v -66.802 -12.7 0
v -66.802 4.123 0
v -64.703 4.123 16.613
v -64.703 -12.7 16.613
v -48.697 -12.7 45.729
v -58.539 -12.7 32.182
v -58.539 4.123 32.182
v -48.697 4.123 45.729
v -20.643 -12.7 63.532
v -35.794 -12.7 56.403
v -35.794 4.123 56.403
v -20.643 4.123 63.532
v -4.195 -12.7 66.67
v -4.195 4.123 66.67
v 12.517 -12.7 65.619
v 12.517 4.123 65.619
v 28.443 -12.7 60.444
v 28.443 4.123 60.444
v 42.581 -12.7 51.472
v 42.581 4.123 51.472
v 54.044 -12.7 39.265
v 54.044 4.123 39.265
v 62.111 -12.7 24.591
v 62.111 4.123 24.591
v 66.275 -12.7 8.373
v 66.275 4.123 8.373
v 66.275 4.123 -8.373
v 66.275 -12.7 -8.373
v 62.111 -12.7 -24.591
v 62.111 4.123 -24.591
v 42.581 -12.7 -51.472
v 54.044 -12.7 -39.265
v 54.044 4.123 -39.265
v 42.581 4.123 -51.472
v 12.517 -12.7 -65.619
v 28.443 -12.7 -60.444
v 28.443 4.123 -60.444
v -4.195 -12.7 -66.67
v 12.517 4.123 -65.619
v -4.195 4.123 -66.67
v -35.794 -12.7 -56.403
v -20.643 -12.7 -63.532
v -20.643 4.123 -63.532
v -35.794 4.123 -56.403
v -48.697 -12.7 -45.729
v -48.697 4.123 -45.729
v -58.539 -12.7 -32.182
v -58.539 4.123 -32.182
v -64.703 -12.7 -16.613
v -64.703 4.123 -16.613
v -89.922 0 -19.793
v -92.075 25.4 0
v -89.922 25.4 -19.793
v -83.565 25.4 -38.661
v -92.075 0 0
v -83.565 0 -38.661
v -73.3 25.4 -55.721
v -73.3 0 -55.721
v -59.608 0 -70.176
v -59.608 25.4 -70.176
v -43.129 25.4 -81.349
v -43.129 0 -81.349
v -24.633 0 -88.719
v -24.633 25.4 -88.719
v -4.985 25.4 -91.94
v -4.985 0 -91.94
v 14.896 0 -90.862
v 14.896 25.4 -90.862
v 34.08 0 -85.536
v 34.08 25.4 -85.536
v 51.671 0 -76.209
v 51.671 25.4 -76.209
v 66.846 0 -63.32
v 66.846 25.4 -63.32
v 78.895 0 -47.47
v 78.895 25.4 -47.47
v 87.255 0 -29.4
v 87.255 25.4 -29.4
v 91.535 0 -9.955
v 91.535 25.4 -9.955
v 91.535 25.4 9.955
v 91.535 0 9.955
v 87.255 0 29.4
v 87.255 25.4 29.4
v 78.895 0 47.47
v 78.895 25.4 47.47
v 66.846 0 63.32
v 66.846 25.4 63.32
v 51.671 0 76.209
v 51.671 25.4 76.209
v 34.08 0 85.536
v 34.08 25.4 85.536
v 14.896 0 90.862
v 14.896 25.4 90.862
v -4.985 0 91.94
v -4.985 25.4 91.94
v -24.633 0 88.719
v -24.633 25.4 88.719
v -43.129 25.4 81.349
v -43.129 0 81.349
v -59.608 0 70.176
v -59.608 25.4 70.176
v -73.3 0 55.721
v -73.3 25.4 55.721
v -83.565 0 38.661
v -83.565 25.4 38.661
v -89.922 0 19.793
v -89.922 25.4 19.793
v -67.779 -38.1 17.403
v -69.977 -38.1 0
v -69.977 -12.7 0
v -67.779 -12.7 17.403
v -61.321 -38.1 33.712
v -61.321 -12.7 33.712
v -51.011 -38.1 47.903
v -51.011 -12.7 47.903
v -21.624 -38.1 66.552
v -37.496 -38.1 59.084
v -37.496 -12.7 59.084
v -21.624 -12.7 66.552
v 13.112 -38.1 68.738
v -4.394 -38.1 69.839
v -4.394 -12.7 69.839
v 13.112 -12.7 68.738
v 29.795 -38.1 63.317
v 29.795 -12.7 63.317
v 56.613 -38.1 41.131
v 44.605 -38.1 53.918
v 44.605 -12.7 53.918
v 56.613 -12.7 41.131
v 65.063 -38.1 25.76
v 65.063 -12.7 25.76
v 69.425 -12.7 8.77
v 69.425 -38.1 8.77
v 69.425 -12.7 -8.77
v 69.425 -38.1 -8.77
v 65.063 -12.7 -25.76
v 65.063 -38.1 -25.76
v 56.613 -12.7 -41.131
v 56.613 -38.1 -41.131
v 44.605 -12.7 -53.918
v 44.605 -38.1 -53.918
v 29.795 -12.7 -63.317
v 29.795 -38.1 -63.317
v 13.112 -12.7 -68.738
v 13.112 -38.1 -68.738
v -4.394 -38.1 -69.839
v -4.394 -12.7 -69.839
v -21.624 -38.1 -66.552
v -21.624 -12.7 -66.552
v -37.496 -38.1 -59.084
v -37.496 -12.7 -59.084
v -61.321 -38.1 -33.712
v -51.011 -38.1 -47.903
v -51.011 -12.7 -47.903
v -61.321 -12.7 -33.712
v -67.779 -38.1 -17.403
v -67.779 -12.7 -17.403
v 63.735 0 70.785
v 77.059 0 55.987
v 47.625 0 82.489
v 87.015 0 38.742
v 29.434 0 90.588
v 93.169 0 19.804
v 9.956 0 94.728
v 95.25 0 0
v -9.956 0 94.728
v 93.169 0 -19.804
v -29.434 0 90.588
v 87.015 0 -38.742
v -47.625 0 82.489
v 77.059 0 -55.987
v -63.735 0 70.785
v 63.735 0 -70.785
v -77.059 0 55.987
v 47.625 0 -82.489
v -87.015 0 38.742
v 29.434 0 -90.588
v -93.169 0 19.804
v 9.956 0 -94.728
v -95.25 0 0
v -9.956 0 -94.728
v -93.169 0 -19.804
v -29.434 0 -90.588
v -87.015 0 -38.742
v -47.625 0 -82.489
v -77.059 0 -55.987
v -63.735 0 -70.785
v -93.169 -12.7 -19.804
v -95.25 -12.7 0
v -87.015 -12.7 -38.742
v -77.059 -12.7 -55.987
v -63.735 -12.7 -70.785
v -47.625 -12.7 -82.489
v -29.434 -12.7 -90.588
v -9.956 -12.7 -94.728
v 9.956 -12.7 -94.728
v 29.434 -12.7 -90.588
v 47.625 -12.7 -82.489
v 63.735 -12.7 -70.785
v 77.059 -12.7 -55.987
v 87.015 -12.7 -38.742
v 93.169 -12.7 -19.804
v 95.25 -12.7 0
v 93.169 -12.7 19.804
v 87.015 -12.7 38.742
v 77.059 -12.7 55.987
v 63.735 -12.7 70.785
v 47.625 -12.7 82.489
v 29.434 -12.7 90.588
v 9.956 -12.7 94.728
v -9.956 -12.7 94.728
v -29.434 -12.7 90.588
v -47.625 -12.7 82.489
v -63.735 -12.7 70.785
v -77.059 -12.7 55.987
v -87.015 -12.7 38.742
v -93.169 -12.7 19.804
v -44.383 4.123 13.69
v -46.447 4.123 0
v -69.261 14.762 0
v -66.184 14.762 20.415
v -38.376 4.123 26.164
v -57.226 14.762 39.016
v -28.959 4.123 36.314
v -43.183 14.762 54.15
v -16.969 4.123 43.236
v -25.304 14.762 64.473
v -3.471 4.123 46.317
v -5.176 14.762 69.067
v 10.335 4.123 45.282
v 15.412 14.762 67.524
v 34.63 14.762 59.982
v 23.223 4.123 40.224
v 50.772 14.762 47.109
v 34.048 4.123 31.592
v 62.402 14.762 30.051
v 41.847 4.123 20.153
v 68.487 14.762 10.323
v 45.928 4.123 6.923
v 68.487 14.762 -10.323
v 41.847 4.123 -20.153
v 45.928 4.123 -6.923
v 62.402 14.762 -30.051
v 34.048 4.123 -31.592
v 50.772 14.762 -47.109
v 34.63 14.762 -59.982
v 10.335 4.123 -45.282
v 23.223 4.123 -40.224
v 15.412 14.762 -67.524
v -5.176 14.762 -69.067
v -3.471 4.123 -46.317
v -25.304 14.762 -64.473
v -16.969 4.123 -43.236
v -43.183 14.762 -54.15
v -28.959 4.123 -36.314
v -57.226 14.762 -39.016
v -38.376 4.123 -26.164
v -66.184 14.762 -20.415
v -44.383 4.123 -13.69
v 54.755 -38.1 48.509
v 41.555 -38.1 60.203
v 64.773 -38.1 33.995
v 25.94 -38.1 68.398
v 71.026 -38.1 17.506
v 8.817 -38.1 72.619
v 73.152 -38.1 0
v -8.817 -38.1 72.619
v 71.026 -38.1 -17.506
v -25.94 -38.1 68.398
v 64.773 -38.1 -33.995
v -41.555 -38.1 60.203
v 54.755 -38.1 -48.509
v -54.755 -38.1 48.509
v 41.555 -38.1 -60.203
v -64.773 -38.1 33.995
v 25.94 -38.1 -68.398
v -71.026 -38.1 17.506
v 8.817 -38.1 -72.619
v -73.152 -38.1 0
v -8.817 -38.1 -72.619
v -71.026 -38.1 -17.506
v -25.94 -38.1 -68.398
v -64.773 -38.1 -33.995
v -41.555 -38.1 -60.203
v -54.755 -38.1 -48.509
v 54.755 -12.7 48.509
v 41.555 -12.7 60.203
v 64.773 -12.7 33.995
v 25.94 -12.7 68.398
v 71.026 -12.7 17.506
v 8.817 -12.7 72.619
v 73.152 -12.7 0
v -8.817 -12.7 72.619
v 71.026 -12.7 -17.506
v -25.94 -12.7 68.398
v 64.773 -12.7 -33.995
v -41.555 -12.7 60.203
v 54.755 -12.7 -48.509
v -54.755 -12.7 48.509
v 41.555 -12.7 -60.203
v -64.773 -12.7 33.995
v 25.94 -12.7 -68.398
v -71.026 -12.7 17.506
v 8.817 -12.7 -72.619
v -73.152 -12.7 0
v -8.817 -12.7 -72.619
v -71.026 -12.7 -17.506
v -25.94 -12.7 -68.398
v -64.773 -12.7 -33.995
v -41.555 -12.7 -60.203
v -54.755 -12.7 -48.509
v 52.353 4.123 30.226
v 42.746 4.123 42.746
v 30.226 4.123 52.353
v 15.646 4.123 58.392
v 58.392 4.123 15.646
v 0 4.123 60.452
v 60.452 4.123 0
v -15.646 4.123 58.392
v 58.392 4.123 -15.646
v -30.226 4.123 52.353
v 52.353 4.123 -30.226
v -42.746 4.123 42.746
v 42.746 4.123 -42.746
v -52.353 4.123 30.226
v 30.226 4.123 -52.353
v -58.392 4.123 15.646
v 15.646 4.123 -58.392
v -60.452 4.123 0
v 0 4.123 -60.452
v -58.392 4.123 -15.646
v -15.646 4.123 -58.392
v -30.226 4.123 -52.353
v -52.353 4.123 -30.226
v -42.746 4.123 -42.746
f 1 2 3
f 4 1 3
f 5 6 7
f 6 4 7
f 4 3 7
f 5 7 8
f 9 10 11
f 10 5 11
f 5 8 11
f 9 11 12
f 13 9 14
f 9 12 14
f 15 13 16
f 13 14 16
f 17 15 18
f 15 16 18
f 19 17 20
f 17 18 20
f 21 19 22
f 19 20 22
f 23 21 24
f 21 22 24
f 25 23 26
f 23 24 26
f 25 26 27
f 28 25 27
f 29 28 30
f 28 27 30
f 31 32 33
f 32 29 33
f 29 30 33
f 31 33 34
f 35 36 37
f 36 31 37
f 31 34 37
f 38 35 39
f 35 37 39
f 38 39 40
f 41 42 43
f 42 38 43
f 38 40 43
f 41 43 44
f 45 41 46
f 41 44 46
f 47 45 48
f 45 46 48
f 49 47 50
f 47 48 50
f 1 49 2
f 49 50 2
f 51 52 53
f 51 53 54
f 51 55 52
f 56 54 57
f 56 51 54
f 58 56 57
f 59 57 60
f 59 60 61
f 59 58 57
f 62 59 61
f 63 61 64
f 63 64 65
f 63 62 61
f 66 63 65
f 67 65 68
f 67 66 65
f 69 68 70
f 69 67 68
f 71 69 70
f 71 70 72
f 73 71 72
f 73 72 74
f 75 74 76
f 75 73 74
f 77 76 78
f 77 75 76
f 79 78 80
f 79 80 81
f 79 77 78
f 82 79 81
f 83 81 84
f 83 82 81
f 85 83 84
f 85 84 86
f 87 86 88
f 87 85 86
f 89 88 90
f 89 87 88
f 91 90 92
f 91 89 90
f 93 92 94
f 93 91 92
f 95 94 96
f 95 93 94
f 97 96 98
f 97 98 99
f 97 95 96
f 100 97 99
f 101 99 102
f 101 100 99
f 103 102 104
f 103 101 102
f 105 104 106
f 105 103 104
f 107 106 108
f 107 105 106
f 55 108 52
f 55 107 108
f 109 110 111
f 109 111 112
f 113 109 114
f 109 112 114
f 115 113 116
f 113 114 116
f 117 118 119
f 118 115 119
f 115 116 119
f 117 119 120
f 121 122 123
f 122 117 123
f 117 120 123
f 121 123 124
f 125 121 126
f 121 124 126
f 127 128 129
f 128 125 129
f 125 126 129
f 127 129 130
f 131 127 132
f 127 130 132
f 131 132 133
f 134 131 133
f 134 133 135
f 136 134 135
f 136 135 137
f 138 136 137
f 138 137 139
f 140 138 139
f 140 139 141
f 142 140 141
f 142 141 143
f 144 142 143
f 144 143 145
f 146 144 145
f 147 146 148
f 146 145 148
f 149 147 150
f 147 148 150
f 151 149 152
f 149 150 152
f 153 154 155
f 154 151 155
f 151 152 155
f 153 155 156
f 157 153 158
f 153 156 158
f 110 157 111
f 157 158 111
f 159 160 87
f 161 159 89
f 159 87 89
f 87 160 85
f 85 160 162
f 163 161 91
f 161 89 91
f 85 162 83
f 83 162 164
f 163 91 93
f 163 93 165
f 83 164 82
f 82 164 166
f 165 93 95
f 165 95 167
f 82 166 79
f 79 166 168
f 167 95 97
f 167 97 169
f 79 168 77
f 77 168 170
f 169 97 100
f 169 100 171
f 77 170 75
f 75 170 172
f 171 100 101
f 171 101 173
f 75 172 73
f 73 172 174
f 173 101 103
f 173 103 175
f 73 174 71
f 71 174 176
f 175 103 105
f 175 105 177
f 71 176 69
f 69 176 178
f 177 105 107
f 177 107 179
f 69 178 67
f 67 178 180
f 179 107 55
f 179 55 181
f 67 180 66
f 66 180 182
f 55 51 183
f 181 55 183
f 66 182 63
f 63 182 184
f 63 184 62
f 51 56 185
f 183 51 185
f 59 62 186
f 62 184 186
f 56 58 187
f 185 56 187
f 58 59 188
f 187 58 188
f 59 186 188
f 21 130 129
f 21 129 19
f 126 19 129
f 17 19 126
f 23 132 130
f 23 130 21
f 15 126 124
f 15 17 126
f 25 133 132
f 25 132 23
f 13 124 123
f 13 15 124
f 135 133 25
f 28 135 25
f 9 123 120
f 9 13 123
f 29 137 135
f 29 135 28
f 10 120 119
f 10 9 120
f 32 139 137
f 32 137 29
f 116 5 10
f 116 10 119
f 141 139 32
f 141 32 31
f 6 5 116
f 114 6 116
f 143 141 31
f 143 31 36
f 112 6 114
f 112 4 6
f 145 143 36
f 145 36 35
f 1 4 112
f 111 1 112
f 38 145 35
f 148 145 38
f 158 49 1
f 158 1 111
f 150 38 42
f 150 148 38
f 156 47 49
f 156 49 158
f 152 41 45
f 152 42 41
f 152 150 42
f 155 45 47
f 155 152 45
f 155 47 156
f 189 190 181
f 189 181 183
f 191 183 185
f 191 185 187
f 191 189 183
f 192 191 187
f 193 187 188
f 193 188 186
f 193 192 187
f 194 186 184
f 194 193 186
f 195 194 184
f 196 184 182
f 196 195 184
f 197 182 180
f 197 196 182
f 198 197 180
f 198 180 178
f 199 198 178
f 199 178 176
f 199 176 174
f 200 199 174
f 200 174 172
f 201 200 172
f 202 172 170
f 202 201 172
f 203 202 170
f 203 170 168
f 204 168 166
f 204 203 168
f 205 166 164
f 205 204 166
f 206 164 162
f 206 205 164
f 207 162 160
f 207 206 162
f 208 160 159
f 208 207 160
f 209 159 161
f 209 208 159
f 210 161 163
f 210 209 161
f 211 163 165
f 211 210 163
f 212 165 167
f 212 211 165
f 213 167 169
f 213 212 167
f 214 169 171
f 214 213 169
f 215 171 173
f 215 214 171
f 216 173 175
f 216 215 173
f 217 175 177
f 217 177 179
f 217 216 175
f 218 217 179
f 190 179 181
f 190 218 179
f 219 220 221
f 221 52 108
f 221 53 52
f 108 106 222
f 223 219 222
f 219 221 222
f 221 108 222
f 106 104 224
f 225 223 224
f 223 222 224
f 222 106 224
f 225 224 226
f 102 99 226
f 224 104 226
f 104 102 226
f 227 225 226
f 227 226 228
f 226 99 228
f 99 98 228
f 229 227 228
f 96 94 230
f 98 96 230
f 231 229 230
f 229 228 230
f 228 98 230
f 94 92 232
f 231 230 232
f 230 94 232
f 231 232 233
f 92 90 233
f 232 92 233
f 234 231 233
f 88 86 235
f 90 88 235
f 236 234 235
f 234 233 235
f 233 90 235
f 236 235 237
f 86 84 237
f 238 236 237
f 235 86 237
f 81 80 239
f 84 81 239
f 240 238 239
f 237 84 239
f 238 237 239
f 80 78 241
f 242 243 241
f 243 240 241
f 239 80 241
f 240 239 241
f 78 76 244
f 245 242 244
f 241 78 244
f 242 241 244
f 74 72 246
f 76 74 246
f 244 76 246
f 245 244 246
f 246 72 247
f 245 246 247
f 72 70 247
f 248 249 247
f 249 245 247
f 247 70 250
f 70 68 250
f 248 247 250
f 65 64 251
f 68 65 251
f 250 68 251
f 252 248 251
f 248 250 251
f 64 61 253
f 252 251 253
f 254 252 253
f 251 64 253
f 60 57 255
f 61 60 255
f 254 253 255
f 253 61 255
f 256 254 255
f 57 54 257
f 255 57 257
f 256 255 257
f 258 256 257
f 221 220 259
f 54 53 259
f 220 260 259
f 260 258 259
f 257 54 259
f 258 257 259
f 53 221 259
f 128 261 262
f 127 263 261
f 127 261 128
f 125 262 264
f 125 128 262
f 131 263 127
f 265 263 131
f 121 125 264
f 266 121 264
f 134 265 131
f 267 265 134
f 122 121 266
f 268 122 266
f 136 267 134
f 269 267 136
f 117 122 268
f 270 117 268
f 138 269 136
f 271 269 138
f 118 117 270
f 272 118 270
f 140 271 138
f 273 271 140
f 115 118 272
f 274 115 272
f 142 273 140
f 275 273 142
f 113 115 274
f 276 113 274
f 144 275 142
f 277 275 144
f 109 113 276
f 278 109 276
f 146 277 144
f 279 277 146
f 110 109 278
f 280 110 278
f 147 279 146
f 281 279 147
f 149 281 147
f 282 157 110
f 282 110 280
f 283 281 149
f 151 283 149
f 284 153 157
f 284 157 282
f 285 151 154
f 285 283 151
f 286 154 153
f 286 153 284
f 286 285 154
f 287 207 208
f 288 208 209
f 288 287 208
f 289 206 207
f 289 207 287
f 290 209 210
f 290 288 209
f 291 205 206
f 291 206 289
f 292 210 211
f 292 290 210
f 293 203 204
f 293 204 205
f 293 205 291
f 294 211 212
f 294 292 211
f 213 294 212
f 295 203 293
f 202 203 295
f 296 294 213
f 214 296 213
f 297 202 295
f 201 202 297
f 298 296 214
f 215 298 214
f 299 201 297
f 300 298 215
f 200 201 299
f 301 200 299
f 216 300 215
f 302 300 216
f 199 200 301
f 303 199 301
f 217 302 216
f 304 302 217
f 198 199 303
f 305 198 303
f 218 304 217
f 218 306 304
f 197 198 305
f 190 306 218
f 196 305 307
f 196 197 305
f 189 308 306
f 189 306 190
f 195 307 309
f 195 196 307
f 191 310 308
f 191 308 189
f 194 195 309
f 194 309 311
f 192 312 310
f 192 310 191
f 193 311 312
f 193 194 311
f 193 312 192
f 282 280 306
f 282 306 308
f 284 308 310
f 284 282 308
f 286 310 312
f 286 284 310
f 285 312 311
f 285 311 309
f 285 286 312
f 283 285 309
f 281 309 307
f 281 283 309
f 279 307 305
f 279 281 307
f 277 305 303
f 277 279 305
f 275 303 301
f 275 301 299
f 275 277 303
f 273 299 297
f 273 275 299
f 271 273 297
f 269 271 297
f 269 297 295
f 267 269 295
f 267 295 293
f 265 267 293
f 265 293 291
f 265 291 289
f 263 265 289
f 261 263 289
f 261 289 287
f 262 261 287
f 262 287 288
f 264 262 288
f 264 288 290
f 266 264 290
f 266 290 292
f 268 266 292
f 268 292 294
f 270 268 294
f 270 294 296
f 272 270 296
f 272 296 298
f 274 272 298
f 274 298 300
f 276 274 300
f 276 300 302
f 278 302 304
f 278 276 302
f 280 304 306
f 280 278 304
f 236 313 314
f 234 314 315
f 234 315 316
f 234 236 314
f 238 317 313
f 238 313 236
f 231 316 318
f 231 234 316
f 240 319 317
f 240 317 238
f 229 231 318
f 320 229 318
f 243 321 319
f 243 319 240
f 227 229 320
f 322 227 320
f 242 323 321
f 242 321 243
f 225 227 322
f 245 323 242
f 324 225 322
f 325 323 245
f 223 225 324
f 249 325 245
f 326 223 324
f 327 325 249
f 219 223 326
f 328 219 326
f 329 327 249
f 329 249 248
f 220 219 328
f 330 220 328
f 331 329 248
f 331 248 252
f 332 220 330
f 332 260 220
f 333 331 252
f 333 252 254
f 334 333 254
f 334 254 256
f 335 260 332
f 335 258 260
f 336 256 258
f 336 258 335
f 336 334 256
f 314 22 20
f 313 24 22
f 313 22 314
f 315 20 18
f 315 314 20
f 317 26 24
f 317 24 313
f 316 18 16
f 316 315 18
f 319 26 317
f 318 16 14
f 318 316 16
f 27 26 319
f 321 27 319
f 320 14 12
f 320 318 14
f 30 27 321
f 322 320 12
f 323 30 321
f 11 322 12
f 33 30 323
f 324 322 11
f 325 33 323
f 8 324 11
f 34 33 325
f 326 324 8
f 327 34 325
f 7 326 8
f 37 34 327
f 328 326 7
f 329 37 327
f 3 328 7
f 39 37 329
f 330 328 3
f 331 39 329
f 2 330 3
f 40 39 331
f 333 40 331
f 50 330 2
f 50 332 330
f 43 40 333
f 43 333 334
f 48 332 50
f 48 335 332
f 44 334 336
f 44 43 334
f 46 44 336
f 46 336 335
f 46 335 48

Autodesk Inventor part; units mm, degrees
ref_plane "YZ Plane" through (0, 0, 0) normal (1, 0, 0) x (0, 1, 0)
ref_plane "XZ Plane" through (0, 0, 0) normal (0, 1, 0) x (-1, 0, 0)
ref_plane "XY Plane" through (0, 0, 0) normal (0, 0, 1) x (1, 0, 0)
sketch "Sketch1" plane through (0, 0, 0) normal (0, 0, 1) x (1, 0, 0)
  line L0 (0, 25.4) -> (-28.702, 25.4) construction
  line L1 (0, 25.4) -> (-95.25, 25.4) construction
  line L2 (-95.25, 25.4) -> (-92.075, 25.4) construction
  line L3 (-92.075, 25.4) -> (-84.455, 21.8467) construction
  line L4 (-92.075, 25.4) -> (-92.075, 22.4389) construction
  line L5 (-92.075, 0) -> (-95.25, 0)
  line L6 (-28.702, 59.0535) -> (-28.702, -92.5226) construction
  arc A0 (-28.9184, -9.8402) -> (-32.3684, -2.4417) centre (-35.052, -8.1967) ccw
  line L7 (-76.2, -186.2977) -> (-28.702, -9.0327)
  line L8 (-92.075, 25.4) -> (-92.075, 0)
  line L9 (-92.075, 25.4) -> (-32.3684, -2.4417)
  line L10 (-28.702, -8.1967) -> (-60.452, -8.1967) construction
  line L11 (-60.452, -127.5253) -> (-54.102, -127.5253) construction
  line L12 (-54.102, -127.5253) -> (-54.102, -103.8268) construction
  line L13 (-54.102, -103.8268) -> (-60.452, -103.8268)
  line L14 (-60.452, 10.654) -> (-60.452, 1.129) construction
  line L15 (-60.452, 10.654) -> (-60.452, 4.1232) construction
  line L16 (-60.452, 4.1232) -> (-46.4468, 4.1232)
  line L17 (-95.25, 0) -> (-95.25, -12.7) construction
  line L18 (-60.452, -12.7) -> (-73.152, -12.7) construction
  line L19 (-95.25, -12.7) -> (-95.25, -25.4) construction
  line L20 (-95.25, -25.4) -> (-95.25, -88.9) construction
  line L21 (-95.25, -88.9) -> (-82.55, -88.9) construction
  line L22 (-82.55, -88.9) -> (-82.55, -25.4) construction
  line L23 (-95.25, -25.4) -> (-82.55, -25.4)
  line L24 (-82.55, -25.4) -> (-82.55, -88.9)
  line L25 (-82.55, -88.9) -> (-95.25, -88.9)
  line L26 (-95.25, -12.7) -> (-73.152, -12.7)
  line L27 (-73.152, -139.3746) -> (-63.627, -139.3746)
  line L28 (-82.55, -88.9) -> (-82.55, -186.2977)
  line L29 (-82.55, -186.2977) -> (-76.2, -186.2977)
  line L30 (-73.152, -12.7) -> (-73.152, -139.3746)
  line L31 (-88.9, -25.4) -> (-88.9, -31.3436)
  line L32 (-88.9, -31.3436) -> (-95.25, -31.3436)
  line L33 (-95.25, 0) -> (-95.25, -25.4)
  line L34 (-95.25, -31.3436) -> (-95.25, -88.9)
  line L35 (-88.9, -160.8977) -> (-88.9, -221.8454)
  line L36 (-28.9184, -9.8402) -> (-85.725, -221.8454)
  line L37 (-85.725, -221.8454) -> (-88.9, -221.8454)
  line L38 (-82.55, -160.8977) -> (-88.9, -160.8977)
  line L39 (-66.802, -38.1) -> (-66.802, 4.1232)
  line L40 (-66.802, 4.1232) -> (-60.452, 4.1232)
  line L41 (-66.802, -38.1) -> (-60.452, -103.8268)
  line L42 (-60.452, 10.654) -> (-60.452, 4.1232) construction
  line L43 (-60.452, -8.1967) -> (-60.452, -12.7) construction
  line L44 (-60.452, -103.8268) -> (-60.452, -127.5253) construction
  line L45 (0, 59.6457) -> (0, -91.9304) construction
  line L46 (-73.152, -38.1) -> (-69.977, -38.1)
  line L47 (-69.977, -38.1) -> (-69.977, -12.7)
  line L48 (-66.802, -12.7) -> (-69.977, -12.7)
  point P0 (0, 0)
  point P1 (-95.25, -256.5049)
  point P2 (-88.7095, 22.4389)
  dimension "d0" = 28.702
  dimension "d1" = 95.25
  dimension "d2" = 3.175
  dimension "d3" = 25
  dimension "d5" = 25.4
  dimension "d6" = 25.4
  dimension "d8" = 12.7
  dimension "d12" = 31.75
  dimension "d13" = 6.35
  dimension "d16" = 12.7
  dimension "d17" = 12.7
  dimension "d18" = 12.7
  dimension "d19" = 63.5
  dimension "d20" = 12.7
  dimension "d22" = 9.525
  dimension "d23" = 6.35
  dimension "d25" = 5.9436
  dimension "d27" = 3.175
  dimension "d28" = 6.35
  dimension "d29" = 25.4
  dimension "d30" = 107.95
  dimension "d31" = 6.35
  dimension "d33" = 20.3552
  dimension "d34" = 15
  dimension "d35" = 3.175
  dimension "d36" = 25.4
revolve "Revolution1" add sketch "Sketch1" angle 360 about axis through (0, 59.6457, 0) along (0, -1, 0) contours L8 L9 L16 L40 L39 L48 L47 L46 L30 L26 L33 L5
properties part number "phenolic_top" material "Phenolic Resin"
